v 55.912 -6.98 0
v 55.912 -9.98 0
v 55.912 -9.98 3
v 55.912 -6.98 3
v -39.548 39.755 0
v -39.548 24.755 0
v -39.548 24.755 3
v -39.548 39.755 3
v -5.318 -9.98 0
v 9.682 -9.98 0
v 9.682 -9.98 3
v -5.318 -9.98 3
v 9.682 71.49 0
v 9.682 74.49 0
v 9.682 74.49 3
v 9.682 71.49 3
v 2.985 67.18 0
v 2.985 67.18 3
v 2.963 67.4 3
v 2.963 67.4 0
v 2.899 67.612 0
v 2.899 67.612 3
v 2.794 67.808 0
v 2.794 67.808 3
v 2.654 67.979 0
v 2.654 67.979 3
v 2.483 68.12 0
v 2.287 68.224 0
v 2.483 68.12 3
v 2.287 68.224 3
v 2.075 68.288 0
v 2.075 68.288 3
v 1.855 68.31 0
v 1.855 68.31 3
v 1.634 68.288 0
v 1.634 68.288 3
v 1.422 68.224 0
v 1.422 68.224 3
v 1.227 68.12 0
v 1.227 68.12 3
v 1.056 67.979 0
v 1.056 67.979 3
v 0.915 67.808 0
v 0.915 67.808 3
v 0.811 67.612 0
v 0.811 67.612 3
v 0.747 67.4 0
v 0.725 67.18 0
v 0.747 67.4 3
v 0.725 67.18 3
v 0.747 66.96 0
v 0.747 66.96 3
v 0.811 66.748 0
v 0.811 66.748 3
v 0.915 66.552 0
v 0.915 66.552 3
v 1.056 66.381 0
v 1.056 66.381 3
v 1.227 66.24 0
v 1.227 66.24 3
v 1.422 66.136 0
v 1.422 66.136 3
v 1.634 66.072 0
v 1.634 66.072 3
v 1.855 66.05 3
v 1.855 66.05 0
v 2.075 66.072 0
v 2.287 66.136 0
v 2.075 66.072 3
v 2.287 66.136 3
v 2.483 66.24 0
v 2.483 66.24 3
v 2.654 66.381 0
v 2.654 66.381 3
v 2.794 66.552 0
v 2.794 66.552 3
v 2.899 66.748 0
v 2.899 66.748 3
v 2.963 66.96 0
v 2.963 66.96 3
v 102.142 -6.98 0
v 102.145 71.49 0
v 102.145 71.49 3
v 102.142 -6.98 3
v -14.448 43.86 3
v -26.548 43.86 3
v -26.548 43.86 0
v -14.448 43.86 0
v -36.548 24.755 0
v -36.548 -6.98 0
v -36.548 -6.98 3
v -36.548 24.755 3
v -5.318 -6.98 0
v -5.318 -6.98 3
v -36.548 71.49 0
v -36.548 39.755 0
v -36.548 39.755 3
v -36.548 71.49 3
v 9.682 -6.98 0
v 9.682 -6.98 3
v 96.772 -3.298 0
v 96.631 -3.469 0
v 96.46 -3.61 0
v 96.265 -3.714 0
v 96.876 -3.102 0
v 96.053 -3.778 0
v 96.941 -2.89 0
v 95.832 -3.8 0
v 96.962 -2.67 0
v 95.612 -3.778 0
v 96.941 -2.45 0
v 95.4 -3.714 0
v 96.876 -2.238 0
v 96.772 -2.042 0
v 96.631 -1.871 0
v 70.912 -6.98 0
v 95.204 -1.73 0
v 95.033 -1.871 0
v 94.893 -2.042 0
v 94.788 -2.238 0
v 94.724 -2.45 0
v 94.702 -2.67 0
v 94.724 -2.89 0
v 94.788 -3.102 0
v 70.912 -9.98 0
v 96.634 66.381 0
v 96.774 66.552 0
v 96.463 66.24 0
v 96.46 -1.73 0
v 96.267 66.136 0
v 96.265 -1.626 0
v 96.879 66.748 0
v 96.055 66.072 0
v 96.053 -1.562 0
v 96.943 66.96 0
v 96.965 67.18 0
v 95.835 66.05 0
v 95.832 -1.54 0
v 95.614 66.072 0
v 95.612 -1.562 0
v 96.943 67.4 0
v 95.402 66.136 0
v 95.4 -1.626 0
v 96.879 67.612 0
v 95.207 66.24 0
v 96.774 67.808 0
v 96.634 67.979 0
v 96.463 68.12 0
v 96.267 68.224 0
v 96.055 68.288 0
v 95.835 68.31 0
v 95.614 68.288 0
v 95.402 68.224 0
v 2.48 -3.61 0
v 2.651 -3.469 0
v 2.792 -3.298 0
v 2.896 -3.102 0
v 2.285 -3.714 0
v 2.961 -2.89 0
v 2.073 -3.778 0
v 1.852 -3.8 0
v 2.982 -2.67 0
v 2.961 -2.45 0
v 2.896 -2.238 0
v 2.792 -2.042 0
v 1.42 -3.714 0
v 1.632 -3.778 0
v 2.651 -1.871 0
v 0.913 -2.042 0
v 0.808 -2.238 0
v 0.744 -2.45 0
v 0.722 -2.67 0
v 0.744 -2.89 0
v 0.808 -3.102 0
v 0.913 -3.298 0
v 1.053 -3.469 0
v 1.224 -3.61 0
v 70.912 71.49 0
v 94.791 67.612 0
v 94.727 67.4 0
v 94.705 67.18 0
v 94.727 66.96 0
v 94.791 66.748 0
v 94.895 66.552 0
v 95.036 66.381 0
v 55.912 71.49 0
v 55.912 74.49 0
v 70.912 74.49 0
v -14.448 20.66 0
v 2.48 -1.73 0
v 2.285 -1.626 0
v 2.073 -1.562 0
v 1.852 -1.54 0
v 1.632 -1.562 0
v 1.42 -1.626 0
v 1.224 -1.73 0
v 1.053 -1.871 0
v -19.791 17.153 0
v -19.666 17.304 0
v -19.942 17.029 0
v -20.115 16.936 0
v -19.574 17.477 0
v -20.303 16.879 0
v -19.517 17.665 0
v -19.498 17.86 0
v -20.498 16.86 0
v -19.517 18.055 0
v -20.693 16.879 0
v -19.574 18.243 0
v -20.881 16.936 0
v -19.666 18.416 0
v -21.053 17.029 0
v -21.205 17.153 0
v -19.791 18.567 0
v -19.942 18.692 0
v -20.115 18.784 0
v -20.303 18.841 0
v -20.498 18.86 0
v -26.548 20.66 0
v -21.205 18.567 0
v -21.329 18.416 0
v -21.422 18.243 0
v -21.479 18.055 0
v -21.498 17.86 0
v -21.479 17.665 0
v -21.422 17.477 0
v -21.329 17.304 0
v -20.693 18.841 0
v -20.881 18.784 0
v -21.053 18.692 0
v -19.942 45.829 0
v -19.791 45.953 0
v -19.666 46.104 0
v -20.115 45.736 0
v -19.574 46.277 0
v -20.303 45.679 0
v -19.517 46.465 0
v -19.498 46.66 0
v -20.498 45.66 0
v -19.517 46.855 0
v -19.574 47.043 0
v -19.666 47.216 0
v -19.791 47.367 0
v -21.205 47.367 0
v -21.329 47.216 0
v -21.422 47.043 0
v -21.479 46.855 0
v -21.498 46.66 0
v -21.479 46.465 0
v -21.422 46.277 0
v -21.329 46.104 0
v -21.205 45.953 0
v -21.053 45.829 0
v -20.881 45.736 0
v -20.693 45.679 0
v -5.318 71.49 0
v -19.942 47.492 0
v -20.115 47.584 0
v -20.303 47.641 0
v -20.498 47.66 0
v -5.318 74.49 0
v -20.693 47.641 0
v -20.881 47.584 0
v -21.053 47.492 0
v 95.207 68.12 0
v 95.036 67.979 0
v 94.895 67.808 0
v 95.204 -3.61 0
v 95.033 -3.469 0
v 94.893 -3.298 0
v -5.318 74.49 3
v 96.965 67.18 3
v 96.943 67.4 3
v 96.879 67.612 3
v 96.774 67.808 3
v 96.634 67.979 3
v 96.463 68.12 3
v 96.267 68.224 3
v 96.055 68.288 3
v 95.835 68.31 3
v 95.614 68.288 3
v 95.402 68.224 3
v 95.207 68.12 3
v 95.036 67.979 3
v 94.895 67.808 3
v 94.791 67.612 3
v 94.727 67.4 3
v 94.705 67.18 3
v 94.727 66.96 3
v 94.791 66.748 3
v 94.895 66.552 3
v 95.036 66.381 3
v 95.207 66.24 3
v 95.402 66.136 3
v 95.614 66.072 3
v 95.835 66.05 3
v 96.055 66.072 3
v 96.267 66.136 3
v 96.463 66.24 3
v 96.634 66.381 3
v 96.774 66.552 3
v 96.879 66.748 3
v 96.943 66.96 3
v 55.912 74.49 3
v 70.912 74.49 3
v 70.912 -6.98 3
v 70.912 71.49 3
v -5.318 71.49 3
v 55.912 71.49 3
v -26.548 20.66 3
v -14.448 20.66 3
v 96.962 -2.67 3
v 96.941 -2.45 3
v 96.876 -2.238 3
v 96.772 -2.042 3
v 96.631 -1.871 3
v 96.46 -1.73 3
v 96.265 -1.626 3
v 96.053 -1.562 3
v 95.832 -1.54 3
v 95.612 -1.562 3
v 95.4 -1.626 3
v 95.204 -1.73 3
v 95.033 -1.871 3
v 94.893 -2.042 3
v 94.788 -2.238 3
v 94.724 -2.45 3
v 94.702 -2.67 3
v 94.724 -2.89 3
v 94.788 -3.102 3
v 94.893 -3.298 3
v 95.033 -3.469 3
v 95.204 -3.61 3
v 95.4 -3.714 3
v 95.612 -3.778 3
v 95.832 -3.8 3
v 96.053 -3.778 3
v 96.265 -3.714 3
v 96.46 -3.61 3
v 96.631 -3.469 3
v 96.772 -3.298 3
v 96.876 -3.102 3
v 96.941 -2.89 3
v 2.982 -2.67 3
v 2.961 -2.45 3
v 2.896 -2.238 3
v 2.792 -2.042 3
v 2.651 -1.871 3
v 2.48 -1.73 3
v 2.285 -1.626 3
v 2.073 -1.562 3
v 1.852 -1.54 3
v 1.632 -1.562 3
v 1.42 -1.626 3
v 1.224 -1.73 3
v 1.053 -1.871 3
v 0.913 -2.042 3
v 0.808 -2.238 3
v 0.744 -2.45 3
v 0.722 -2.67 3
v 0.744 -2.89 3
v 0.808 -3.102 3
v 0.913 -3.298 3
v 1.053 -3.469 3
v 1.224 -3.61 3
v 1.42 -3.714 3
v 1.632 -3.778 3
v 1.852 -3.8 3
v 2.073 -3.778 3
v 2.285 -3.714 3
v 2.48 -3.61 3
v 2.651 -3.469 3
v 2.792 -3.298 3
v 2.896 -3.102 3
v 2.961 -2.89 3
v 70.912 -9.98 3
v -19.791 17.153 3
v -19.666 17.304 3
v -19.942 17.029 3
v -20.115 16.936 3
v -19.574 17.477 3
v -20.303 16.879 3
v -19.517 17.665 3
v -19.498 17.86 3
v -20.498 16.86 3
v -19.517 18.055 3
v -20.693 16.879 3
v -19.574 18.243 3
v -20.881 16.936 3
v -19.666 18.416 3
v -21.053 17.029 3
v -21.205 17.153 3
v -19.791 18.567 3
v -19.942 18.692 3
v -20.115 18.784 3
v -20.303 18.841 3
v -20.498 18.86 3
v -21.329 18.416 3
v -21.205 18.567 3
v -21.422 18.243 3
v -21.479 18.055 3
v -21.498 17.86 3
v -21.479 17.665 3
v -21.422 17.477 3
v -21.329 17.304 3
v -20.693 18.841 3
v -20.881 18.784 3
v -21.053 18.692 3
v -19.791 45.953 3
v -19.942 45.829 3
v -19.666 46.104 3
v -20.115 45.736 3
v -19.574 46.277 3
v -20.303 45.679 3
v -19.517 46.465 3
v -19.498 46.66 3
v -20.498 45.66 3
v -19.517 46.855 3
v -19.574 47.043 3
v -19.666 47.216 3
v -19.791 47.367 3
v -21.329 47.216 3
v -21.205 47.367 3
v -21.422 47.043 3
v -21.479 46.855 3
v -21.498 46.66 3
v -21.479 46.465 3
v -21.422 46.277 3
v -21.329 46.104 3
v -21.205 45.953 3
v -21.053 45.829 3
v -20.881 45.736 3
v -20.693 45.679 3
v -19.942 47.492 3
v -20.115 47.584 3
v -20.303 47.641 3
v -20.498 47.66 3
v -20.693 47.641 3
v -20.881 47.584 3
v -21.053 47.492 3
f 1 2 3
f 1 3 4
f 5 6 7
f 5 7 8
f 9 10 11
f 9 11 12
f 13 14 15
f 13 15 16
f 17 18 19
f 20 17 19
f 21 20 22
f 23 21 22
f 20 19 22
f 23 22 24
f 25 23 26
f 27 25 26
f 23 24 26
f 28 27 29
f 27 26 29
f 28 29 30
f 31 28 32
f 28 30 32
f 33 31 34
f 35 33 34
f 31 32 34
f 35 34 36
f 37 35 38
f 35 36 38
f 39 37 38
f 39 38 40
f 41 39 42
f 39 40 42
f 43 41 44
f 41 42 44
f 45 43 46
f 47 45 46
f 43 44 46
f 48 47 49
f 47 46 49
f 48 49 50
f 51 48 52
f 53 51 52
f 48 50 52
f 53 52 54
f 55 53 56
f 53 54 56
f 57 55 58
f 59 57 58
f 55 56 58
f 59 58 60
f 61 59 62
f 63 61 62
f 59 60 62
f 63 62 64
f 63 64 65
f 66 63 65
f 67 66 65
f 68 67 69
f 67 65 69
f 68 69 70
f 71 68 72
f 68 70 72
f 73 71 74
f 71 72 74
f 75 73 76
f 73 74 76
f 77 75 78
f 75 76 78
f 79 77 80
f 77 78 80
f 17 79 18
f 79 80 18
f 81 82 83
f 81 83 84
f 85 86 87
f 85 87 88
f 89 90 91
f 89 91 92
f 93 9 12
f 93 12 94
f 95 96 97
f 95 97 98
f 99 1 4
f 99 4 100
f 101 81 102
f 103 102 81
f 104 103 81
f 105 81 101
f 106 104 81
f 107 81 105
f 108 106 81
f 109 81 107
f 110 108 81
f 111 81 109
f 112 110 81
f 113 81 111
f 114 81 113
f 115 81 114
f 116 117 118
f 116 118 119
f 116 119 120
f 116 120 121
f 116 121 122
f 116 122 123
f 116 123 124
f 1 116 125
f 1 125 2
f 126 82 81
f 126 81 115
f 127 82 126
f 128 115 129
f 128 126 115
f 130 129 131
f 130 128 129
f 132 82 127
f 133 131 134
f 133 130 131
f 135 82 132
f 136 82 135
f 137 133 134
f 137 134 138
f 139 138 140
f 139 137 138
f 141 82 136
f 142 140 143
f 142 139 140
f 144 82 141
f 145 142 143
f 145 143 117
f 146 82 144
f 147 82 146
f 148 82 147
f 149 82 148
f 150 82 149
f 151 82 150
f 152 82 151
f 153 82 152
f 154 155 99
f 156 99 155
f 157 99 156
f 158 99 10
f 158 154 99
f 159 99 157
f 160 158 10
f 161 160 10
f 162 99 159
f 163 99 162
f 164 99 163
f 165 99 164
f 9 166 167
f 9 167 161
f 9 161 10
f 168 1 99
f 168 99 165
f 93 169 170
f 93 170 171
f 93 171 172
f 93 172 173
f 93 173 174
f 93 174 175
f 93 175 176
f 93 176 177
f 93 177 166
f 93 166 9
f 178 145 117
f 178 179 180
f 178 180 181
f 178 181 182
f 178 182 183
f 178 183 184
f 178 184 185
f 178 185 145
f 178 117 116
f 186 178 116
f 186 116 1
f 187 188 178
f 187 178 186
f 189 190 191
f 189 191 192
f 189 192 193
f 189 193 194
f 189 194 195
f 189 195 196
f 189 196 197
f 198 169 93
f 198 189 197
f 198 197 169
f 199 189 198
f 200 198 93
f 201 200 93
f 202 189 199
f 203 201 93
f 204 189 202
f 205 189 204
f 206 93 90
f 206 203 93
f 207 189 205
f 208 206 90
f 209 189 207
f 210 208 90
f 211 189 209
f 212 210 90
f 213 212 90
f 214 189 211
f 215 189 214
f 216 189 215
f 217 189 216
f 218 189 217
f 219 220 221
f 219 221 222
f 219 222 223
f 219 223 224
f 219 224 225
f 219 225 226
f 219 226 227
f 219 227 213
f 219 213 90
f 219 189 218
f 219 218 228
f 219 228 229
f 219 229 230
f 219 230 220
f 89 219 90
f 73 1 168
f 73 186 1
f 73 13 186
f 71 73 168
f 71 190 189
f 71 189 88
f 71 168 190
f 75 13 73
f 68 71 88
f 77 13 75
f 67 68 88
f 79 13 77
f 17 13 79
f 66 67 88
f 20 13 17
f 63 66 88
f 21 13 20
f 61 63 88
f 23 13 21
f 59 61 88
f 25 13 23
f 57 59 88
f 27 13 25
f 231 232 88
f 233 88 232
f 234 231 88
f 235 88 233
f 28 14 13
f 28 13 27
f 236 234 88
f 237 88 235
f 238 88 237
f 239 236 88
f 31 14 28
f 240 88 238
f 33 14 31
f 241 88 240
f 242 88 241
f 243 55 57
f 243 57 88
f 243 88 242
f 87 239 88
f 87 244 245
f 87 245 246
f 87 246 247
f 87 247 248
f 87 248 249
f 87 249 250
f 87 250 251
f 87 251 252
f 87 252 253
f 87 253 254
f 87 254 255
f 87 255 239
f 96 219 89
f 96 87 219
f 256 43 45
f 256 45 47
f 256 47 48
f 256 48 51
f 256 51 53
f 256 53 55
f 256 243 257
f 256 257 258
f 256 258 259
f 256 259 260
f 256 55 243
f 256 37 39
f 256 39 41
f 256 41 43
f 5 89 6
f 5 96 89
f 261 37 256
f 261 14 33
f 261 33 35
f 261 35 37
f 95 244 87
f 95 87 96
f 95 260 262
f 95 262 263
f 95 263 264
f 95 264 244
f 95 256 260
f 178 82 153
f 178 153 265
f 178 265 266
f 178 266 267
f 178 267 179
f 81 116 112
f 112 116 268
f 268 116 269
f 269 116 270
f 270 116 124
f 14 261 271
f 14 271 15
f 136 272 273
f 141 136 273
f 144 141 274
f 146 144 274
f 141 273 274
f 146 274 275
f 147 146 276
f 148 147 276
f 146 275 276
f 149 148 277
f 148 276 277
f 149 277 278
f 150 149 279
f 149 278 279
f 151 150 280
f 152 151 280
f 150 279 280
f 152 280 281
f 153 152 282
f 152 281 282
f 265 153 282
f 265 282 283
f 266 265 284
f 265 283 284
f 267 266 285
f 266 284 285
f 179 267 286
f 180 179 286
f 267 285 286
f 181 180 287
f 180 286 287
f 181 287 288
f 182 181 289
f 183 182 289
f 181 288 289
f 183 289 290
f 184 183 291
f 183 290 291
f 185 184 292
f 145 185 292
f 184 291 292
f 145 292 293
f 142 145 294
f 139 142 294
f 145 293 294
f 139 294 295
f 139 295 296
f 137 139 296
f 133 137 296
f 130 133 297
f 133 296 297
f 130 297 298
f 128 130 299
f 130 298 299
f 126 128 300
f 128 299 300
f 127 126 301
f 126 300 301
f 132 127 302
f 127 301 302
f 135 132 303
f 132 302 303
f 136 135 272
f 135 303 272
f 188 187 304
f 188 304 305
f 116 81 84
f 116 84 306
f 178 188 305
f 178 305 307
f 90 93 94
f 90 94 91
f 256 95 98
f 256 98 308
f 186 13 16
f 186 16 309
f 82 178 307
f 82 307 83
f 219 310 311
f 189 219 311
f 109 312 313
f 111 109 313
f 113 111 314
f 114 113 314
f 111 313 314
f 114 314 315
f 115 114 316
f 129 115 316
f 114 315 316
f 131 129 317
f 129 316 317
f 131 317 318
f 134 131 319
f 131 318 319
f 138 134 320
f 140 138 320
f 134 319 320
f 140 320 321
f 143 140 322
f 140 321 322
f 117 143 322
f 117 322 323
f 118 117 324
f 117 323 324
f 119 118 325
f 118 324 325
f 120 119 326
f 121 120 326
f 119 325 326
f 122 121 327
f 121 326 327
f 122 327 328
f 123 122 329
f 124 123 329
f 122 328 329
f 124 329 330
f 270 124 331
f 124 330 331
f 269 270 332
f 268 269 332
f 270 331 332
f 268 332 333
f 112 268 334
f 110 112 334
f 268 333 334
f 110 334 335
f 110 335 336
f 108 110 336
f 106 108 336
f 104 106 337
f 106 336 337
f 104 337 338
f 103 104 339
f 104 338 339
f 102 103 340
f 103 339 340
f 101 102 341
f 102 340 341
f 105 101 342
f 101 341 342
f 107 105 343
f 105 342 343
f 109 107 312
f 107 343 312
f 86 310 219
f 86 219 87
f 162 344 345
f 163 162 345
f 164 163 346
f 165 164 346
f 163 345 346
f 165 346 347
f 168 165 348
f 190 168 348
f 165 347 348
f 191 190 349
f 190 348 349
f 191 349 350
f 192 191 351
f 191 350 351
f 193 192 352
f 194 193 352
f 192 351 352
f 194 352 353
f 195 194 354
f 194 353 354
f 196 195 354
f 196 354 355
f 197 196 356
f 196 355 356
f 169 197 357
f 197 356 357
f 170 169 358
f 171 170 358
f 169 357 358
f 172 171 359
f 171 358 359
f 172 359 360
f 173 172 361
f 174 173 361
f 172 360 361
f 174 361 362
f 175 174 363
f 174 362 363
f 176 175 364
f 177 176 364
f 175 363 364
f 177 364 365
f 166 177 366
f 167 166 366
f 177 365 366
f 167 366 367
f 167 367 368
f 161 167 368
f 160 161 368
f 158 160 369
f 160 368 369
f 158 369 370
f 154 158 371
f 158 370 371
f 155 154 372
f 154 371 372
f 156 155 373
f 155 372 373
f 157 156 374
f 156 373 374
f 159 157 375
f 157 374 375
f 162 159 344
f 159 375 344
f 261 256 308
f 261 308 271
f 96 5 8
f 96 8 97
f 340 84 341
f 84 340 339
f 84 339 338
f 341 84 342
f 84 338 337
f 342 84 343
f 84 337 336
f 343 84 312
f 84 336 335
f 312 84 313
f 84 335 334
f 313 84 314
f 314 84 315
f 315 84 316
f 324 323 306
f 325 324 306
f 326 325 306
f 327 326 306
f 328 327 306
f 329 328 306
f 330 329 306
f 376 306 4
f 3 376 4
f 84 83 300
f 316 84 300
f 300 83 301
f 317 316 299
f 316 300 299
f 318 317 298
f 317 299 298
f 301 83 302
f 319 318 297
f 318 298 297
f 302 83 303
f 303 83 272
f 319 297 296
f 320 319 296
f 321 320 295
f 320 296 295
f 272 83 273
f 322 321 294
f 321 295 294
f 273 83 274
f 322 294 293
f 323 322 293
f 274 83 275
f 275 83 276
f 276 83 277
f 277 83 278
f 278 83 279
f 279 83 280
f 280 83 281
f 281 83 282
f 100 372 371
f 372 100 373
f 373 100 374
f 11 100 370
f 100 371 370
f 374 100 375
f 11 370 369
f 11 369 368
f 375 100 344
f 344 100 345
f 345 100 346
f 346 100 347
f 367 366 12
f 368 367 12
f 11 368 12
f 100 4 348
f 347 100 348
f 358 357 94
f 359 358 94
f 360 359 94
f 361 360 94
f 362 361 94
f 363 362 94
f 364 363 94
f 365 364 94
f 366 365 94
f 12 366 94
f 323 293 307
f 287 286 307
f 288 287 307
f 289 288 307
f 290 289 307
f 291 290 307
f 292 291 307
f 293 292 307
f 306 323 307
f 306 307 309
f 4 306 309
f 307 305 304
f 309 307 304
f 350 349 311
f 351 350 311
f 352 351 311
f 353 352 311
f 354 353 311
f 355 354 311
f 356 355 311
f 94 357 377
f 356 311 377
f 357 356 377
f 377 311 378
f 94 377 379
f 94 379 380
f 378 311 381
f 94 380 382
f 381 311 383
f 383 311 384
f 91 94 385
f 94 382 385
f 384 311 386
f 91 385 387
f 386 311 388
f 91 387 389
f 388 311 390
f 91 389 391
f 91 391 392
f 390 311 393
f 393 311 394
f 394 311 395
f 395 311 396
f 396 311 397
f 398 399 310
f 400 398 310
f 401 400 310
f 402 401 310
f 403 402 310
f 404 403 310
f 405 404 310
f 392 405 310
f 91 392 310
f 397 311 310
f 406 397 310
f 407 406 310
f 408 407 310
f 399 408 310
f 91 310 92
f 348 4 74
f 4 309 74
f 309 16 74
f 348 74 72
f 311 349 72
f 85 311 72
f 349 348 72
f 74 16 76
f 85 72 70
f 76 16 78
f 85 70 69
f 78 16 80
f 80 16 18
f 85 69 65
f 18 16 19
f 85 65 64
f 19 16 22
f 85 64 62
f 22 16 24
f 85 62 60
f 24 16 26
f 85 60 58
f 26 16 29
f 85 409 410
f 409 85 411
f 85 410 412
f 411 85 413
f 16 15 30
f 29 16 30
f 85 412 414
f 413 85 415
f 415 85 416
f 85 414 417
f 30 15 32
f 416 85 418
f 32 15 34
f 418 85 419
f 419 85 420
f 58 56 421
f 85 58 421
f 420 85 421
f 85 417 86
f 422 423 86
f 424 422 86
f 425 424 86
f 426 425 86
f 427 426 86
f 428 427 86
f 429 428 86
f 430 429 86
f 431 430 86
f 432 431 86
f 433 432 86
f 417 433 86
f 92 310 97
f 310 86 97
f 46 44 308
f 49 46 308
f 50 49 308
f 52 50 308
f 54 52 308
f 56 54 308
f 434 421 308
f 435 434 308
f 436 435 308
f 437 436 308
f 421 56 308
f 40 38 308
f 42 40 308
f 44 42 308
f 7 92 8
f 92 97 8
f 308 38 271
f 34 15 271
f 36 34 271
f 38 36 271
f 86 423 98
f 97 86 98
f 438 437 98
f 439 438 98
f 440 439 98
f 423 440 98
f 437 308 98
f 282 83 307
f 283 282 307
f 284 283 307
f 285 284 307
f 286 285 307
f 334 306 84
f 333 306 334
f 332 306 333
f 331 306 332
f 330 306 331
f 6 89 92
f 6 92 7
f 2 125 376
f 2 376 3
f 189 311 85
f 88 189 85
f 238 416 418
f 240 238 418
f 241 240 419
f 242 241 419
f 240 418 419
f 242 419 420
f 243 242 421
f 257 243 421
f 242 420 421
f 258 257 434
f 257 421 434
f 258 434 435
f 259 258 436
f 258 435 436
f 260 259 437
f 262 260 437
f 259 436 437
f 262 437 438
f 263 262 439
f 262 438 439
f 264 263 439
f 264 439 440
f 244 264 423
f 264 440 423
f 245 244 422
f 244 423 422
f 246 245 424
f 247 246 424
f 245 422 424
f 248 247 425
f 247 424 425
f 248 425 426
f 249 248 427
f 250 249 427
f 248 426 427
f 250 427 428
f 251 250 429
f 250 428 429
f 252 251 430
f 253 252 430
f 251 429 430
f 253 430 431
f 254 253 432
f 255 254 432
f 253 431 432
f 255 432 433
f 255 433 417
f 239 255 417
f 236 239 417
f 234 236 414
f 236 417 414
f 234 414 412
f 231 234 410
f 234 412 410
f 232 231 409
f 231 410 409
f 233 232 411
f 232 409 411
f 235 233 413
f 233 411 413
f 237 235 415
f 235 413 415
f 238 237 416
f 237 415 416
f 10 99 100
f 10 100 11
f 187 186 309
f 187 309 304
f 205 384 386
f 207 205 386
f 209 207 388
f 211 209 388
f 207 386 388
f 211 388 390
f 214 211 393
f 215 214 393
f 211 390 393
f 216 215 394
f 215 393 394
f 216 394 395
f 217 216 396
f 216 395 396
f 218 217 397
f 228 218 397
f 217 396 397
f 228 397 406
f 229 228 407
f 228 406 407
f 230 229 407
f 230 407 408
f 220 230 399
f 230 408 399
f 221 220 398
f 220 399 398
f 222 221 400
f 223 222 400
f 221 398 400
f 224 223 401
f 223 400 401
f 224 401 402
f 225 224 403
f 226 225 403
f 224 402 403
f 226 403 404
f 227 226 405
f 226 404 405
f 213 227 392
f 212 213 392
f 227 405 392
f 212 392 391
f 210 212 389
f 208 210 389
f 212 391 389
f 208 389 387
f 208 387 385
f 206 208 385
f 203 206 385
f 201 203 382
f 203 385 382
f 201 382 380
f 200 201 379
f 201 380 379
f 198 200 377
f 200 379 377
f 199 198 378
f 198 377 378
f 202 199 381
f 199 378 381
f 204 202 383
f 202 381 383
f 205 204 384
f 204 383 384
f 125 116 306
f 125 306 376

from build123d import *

# Parameters (mm, degrees)
BOSS_EXTRUDE1_DEPTH = 3
SKETCH2_R           = 1.13
CUT_EXTRUDE1_DEPTH  = 3
SKETCH3_R           = 1
SKETCH3_W           = 12.1
SKETCH3_H           = 23.2
CUT_EXTRUDE4_DEPTH  = 3


with BuildPart() as part:
    # Sketch1 → Boss-Extrude1 (new body)
    with BuildSketch(Plane.XY):
        Polygon((-36.547918648, 71.490037876), (-5.317918648, 71.490037876), (-5.317918648, 74.490037876), (9.682081352, 74.490037876), (9.682081352, 71.490037876), (55.912081352, 71.490037876), (55.912081352, 74.490037876), (70.912081352, 74.490037876), (70.912081352, 71.490037876), (102.145081352, 71.490037876), (102.142081352, -6.979962124), (70.912081352, -6.979962124), (70.912081352, -9.979962124), (55.912081352, -9.979962124), (55.912081352, -6.979962124), (9.682081352, -6.979962124), (9.682081352, -9.979962124), (-5.317918648, -9.979962124), (-5.317918648, -6.979962124), (-36.547918648, -6.979962124), (-36.547918648, 24.755037876), (-39.547918648, 24.755037876), (-39.547918648, 39.755037876), (-36.547918648, 39.755037876), align=None)
    extrude(amount=BOSS_EXTRUDE1_DEPTH)

    # Sketch2 → Cut-Extrude1 (cut)
    with BuildSketch(Plane.XY.offset(3)):
        with Locations((95.834916571, 67.180037876)):
            Circle(SKETCH2_R)
        with Locations((95.832246124, -2.669962124)):
            Circle(SKETCH2_R)
        with Locations((1.854916503, 67.180037876)):
            Circle(SKETCH2_R)
        with Locations((1.852246055, -2.669962124)):
            Circle(SKETCH2_R)
    extrude(amount=-CUT_EXTRUDE1_DEPTH, mode=Mode.SUBTRACT)

    # Sketch3 → Cut-Extrude4 (cut)
    with BuildSketch(Plane.XY.offset(3)):
        with Locations((-20.497918648, 46.660037876)):
            Circle(SKETCH3_R)
        with Locations((-20.497918648, 17.860037876)):
            Circle(SKETCH3_R)
        with Locations((-20.497918648, 32.260037876)):
            Rectangle(SKETCH3_W, SKETCH3_H)
    extrude(amount=-CUT_EXTRUDE4_DEPTH, mode=Mode.SUBTRACT)


solid = part.part
